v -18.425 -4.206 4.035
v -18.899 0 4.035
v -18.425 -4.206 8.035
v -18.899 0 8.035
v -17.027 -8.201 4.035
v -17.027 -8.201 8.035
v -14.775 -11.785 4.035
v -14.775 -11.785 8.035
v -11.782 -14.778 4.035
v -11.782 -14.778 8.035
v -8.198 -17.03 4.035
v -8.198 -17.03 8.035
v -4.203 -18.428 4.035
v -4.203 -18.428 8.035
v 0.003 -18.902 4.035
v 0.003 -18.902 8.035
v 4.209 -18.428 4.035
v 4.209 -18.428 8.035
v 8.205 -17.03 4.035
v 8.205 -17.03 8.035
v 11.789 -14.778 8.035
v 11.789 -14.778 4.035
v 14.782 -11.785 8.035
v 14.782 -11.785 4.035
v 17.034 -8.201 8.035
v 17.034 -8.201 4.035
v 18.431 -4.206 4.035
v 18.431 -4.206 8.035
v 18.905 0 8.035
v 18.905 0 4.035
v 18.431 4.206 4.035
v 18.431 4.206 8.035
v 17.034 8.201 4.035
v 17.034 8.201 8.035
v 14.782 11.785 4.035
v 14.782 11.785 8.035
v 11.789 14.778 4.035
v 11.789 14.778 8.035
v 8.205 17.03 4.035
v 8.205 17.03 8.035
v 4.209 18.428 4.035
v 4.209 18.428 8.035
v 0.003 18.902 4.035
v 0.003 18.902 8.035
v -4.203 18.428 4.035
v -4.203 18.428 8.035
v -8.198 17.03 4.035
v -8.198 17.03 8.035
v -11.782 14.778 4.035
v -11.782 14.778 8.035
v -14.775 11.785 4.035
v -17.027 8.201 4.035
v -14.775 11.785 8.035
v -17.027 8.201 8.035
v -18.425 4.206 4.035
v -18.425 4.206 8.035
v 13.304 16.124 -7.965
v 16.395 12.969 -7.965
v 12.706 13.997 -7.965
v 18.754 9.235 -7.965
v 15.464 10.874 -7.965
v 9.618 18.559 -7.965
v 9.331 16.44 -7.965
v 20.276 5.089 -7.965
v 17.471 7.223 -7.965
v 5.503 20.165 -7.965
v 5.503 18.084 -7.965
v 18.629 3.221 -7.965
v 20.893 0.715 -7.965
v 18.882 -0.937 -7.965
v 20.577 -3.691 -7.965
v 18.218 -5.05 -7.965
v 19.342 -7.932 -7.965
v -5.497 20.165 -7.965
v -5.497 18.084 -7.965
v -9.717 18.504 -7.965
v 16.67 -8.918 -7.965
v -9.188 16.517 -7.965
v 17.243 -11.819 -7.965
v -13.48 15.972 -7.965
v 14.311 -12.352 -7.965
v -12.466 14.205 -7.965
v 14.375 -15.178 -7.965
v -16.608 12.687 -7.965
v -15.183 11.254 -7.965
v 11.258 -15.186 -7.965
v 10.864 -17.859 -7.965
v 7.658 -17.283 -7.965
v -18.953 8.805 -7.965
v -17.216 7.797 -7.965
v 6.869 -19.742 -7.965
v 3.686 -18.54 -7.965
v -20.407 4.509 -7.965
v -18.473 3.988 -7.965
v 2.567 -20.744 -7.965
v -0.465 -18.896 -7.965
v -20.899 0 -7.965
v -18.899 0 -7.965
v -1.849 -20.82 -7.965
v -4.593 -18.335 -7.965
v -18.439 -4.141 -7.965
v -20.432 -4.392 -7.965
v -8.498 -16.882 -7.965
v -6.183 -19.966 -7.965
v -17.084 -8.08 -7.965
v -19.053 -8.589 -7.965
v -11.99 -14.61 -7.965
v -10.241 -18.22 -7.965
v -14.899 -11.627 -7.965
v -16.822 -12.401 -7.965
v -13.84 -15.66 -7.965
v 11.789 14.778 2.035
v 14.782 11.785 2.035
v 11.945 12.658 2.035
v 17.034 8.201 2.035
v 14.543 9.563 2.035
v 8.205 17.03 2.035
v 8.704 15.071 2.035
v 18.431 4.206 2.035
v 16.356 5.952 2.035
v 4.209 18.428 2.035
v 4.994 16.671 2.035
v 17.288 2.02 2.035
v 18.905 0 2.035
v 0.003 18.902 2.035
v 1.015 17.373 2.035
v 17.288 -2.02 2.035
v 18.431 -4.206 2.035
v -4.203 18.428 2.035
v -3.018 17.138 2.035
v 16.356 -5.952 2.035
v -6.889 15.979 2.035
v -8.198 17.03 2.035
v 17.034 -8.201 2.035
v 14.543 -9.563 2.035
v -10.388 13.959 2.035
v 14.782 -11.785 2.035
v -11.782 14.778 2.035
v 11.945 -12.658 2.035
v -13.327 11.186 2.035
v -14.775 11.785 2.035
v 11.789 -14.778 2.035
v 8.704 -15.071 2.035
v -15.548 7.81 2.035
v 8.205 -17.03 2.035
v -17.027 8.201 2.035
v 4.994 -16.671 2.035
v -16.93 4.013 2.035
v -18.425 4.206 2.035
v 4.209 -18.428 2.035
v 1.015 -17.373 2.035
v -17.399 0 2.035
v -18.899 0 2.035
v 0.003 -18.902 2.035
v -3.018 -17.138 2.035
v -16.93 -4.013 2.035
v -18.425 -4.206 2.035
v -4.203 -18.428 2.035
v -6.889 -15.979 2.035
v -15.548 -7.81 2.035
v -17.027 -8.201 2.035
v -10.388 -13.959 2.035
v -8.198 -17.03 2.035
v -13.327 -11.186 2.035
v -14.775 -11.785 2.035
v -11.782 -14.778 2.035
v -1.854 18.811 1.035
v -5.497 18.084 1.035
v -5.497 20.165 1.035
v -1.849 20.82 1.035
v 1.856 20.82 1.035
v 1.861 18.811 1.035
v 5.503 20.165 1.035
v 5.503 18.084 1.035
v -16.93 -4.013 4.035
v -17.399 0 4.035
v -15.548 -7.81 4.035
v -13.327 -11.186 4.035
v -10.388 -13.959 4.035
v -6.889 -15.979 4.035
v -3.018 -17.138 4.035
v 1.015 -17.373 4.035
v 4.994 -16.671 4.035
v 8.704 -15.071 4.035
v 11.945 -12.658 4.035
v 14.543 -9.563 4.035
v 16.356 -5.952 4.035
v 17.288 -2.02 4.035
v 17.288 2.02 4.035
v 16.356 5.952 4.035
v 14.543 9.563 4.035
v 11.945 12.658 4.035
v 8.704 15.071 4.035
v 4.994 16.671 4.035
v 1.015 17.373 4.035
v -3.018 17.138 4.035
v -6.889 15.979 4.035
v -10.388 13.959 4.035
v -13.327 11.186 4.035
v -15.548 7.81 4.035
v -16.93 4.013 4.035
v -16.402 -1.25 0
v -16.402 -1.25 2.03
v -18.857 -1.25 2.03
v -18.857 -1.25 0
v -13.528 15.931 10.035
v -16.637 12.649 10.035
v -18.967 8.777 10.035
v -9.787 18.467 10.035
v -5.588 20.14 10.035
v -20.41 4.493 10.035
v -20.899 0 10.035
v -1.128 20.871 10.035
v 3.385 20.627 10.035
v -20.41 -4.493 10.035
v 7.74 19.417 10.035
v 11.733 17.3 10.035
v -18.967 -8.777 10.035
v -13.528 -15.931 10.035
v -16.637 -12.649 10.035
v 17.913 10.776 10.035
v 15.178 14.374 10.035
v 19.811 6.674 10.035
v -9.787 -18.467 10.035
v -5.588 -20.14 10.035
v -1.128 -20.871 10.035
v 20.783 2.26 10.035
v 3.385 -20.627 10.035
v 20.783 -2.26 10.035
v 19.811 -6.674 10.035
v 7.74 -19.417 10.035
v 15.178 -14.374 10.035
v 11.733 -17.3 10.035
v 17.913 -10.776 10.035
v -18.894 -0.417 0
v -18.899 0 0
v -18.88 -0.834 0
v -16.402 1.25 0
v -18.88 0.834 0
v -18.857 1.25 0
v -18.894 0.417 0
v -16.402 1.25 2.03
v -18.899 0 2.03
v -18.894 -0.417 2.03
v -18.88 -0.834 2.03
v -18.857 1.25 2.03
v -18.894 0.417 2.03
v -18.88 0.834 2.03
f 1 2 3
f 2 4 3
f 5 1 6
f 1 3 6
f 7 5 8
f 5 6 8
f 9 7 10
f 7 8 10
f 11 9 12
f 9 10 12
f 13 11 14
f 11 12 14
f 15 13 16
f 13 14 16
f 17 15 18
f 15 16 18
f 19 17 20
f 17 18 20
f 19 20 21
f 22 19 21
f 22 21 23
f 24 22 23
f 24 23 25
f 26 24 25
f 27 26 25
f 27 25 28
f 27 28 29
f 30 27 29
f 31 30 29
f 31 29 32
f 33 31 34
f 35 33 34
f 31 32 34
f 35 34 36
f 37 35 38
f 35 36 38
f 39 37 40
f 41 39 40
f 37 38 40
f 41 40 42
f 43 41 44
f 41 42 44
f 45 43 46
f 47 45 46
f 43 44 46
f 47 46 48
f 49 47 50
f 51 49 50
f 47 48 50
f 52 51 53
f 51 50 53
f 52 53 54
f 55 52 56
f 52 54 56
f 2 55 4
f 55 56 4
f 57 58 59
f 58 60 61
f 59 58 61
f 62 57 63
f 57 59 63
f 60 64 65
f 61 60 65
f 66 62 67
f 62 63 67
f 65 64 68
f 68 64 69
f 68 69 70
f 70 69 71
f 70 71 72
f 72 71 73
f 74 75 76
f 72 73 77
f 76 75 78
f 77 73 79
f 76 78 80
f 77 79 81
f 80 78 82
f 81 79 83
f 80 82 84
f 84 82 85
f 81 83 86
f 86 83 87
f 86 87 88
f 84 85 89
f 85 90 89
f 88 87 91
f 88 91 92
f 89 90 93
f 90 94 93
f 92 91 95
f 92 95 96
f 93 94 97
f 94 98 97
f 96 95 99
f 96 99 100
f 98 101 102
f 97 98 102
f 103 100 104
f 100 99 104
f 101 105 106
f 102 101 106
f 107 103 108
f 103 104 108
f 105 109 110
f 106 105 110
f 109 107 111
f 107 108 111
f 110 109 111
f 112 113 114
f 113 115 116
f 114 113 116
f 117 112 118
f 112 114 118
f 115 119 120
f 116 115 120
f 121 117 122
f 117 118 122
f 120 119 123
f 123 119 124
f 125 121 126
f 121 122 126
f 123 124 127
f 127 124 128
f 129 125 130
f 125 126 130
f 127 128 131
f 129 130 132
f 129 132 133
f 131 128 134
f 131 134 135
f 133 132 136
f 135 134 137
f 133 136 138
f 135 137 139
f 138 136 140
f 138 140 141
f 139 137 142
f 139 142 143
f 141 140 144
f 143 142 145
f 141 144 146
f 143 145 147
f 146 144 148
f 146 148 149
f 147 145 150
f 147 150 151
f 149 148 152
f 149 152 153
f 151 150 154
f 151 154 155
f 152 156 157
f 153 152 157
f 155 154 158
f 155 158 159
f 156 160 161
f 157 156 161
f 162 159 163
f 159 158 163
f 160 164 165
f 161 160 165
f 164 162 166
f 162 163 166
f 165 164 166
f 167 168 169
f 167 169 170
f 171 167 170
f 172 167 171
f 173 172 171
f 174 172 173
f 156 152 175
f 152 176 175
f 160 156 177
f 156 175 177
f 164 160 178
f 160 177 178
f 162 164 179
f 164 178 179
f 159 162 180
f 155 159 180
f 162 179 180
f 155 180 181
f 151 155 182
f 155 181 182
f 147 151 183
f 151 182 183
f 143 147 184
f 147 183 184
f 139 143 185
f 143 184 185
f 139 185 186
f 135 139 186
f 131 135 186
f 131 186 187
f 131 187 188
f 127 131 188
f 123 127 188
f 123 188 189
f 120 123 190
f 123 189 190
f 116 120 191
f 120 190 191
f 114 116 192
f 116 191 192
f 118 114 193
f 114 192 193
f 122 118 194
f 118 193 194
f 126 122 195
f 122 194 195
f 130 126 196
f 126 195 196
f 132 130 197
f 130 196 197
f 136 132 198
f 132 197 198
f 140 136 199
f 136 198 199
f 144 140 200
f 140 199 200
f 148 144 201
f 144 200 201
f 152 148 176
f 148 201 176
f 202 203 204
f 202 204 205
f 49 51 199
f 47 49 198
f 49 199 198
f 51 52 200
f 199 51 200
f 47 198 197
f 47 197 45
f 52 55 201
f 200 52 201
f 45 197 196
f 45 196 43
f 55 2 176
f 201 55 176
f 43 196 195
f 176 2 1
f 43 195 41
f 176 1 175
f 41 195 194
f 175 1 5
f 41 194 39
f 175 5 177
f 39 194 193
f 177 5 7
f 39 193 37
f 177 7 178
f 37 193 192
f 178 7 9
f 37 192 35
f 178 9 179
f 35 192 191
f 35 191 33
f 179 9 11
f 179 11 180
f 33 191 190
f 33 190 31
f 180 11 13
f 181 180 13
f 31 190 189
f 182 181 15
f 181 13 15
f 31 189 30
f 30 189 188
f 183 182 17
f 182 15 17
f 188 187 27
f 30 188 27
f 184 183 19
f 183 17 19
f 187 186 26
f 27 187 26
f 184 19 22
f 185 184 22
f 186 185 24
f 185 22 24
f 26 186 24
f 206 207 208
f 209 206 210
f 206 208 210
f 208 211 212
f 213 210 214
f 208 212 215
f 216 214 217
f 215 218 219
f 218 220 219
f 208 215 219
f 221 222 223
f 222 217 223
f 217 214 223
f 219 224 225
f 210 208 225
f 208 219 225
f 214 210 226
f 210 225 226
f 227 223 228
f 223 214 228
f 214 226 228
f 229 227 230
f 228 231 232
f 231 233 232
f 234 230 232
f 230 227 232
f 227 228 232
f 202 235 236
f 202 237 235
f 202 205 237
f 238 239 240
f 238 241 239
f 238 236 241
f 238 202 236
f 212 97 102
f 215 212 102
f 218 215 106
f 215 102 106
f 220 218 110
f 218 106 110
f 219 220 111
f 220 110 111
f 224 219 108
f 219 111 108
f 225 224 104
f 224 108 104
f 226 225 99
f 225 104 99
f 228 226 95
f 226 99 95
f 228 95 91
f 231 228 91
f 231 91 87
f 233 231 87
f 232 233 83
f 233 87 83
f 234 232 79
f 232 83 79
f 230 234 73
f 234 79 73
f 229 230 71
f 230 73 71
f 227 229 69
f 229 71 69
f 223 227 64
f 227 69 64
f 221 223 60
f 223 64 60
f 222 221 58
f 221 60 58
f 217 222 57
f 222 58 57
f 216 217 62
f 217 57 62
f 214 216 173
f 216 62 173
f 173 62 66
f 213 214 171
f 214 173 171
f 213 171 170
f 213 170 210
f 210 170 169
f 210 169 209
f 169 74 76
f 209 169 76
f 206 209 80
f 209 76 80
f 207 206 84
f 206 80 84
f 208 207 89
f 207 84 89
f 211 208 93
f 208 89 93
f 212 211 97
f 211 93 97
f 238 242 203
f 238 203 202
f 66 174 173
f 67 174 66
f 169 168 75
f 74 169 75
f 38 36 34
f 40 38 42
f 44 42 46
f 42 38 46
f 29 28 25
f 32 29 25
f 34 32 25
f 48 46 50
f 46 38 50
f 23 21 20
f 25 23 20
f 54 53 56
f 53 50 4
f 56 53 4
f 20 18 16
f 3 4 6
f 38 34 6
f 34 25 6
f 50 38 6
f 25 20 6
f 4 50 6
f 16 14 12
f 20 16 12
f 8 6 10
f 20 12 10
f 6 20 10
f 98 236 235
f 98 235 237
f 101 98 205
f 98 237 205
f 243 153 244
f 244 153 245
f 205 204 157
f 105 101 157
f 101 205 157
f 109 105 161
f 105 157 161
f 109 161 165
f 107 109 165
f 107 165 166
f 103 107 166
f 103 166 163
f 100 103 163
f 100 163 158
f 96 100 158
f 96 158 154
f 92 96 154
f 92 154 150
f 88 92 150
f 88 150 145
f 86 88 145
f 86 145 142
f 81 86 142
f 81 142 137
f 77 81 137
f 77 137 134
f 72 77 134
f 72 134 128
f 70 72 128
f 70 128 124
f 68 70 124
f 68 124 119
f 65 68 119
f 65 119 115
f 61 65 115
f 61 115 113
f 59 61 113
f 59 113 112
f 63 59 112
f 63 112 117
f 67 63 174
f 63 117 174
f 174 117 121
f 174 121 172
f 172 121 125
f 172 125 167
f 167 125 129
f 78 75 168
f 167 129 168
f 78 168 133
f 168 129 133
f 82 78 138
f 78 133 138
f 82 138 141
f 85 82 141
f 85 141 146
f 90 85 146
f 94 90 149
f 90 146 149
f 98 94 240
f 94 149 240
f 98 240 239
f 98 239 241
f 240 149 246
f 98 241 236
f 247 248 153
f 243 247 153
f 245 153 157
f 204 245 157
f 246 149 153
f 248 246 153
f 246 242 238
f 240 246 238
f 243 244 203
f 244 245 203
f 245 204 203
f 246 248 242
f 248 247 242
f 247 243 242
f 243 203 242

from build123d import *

# Parameters (mm, degrees)
SKIZZE2_W                       = 11
SKIZZE2_H                       = 9
SCHNITT_LINEAR_AUSTRAGEN2_DEPTH = 25
SKIZZE3_W                       = 2.03
SKIZZE3_H                       = 2.5
AUFSATZ_LINEAR_AUSTRAGEN1_DEPTH = 18.902
SKIZZE3_3_W                     = 2.03
SKIZZE3_3_H                     = 2.5
SCHNITT_LINEAR_AUSTRAGEN3_DEPTH = 16.402


with BuildPart() as part:
    # Skizze1 → Rotation2 (revolve)
    with BuildSketch(Plane(origin=(0, 0, 0), x_dir=(1, 0, 0), z_dir=(0, 1, 0))):
        Polygon((0.00340061, -8.034840547), (0.00340061, -10.034840547), (20.90540061, -10.034840547), (20.90540061, 7.965159453), (18.90540061, 7.965159453), (18.90540061, -2.034840547), (17.40540061, -2.034840547), (17.40540061, -4.034840547), (18.90540061, -4.034840547), (18.90540061, -8.034840547), align=None)
    revolve(axis=Axis((0.00340061, 0, 8.034840547), (0, 0, 1)))

    # Skizze2 → Schnitt-Linear austragen2 (cut)
    with BuildSketch(Plane(origin=(0, 0, 0), x_dir=(1, 0, 0), z_dir=(0, 1, 0))):
        with Locations((0.00340061, 3.465159453)):
            Rectangle(SKIZZE2_W, SKIZZE2_H)
    extrude(amount=SCHNITT_LINEAR_AUSTRAGEN2_DEPTH, mode=Mode.SUBTRACT)

    # Skizze3 → Aufsatz-Linear austragen1 (add)
    with BuildSketch(Plane(origin=(0, 0, 0), x_dir=(0, 0, -1), z_dir=(1, 0, 0))):
        with Locations((-1.015, 0)):
            Rectangle(SKIZZE3_W, SKIZZE3_H)
    extrude(amount=-AUFSATZ_LINEAR_AUSTRAGEN1_DEPTH)

    # Skizze3<3> → Schnitt-Linear austragen3 (cut)
    with BuildSketch(Plane(origin=(0, 0, 0), x_dir=(0, 0, -1), z_dir=(1, 0, 0))):
        with Locations((-1.015, 0)):
            Rectangle(SKIZZE3_3_W, SKIZZE3_3_H)
    extrude(amount=-SCHNITT_LINEAR_AUSTRAGEN3_DEPTH, mode=Mode.SUBTRACT)


solid = part.part
